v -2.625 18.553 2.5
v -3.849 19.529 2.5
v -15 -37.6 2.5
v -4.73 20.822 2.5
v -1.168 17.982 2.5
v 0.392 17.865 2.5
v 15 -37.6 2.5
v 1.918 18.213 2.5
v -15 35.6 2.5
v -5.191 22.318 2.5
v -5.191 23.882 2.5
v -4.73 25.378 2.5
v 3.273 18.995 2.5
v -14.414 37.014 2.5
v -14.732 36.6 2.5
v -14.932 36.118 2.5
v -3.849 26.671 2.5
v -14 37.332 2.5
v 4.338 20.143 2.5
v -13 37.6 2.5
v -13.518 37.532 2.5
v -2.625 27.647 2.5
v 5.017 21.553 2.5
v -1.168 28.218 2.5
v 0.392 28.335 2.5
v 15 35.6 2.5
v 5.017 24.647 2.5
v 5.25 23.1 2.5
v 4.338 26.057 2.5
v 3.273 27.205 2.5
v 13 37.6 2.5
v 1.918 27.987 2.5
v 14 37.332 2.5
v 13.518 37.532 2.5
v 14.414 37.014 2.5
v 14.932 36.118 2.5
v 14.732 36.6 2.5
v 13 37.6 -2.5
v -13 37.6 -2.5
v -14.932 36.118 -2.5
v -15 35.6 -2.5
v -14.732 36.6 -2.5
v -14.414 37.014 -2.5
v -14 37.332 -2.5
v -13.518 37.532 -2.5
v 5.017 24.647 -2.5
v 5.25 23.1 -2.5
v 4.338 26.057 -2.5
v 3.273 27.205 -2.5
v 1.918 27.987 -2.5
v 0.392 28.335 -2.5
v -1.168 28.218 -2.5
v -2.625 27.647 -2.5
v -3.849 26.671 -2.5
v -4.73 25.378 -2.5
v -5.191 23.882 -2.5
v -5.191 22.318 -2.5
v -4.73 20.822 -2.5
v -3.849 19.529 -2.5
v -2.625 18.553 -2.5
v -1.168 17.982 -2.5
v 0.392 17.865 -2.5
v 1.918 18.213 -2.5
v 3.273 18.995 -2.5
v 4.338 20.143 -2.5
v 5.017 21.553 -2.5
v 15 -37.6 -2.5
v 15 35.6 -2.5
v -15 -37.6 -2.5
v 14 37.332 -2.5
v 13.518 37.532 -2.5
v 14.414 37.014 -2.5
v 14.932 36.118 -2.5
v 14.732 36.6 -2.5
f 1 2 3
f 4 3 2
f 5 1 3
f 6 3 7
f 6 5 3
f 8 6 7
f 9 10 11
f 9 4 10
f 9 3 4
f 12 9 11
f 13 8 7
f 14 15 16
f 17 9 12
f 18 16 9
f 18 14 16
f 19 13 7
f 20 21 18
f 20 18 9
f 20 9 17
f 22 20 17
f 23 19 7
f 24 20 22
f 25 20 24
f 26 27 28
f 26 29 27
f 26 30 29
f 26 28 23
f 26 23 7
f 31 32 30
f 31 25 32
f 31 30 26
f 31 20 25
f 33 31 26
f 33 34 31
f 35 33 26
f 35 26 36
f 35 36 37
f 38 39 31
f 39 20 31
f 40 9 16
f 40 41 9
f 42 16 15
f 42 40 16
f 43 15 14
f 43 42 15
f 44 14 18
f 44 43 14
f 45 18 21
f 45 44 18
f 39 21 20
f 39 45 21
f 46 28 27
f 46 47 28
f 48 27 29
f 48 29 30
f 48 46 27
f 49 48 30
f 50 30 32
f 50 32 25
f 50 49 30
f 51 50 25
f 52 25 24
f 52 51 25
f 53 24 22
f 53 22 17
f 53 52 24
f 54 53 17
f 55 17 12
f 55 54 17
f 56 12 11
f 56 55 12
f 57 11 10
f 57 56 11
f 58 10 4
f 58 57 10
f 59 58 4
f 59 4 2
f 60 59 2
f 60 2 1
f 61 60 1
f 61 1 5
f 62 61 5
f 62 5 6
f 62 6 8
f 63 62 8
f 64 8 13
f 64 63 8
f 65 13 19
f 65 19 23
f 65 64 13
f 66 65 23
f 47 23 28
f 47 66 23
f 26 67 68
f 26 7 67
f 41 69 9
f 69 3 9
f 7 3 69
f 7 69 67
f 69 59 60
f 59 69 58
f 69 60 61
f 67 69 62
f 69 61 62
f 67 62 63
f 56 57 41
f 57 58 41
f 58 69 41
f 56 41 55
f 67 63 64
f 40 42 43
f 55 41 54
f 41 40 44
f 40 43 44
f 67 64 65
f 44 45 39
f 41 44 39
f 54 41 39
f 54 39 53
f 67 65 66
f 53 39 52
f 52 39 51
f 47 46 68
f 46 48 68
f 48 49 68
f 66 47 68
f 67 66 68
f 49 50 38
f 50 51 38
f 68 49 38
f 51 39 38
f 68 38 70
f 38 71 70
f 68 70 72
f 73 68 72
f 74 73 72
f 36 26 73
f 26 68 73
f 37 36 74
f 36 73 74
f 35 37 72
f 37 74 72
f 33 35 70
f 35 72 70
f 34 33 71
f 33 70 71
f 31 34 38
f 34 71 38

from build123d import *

# Parameters (mm, degrees)
SKETCH1_W           = 30
SKETCH1_H           = 75.2
SKETCH1_R           = 5.25
BOSS_EXTRUDE1_DEPTH = 2.5
FILLET1_R           = 2


with BuildPart() as part:
    # Sketch1 → Boss-Extrude1 (new, symmetric)
    with BuildSketch(Plane.XY):
        Rectangle(SKETCH1_W, SKETCH1_H)
        with Locations((0, 23.1)):
            Circle(SKETCH1_R, mode=Mode.SUBTRACT)
    extrude(amount=BOSS_EXTRUDE1_DEPTH, both=True)

    # Fillet1
    fillet1_edges = [part.edges().sort_by_distance(p)[0] for p in [
        (-15, 37.6, 0),
        (15, 37.6, 0),
    ]]
    fillet(fillet1_edges, radius=FILLET1_R)


solid = part.part
